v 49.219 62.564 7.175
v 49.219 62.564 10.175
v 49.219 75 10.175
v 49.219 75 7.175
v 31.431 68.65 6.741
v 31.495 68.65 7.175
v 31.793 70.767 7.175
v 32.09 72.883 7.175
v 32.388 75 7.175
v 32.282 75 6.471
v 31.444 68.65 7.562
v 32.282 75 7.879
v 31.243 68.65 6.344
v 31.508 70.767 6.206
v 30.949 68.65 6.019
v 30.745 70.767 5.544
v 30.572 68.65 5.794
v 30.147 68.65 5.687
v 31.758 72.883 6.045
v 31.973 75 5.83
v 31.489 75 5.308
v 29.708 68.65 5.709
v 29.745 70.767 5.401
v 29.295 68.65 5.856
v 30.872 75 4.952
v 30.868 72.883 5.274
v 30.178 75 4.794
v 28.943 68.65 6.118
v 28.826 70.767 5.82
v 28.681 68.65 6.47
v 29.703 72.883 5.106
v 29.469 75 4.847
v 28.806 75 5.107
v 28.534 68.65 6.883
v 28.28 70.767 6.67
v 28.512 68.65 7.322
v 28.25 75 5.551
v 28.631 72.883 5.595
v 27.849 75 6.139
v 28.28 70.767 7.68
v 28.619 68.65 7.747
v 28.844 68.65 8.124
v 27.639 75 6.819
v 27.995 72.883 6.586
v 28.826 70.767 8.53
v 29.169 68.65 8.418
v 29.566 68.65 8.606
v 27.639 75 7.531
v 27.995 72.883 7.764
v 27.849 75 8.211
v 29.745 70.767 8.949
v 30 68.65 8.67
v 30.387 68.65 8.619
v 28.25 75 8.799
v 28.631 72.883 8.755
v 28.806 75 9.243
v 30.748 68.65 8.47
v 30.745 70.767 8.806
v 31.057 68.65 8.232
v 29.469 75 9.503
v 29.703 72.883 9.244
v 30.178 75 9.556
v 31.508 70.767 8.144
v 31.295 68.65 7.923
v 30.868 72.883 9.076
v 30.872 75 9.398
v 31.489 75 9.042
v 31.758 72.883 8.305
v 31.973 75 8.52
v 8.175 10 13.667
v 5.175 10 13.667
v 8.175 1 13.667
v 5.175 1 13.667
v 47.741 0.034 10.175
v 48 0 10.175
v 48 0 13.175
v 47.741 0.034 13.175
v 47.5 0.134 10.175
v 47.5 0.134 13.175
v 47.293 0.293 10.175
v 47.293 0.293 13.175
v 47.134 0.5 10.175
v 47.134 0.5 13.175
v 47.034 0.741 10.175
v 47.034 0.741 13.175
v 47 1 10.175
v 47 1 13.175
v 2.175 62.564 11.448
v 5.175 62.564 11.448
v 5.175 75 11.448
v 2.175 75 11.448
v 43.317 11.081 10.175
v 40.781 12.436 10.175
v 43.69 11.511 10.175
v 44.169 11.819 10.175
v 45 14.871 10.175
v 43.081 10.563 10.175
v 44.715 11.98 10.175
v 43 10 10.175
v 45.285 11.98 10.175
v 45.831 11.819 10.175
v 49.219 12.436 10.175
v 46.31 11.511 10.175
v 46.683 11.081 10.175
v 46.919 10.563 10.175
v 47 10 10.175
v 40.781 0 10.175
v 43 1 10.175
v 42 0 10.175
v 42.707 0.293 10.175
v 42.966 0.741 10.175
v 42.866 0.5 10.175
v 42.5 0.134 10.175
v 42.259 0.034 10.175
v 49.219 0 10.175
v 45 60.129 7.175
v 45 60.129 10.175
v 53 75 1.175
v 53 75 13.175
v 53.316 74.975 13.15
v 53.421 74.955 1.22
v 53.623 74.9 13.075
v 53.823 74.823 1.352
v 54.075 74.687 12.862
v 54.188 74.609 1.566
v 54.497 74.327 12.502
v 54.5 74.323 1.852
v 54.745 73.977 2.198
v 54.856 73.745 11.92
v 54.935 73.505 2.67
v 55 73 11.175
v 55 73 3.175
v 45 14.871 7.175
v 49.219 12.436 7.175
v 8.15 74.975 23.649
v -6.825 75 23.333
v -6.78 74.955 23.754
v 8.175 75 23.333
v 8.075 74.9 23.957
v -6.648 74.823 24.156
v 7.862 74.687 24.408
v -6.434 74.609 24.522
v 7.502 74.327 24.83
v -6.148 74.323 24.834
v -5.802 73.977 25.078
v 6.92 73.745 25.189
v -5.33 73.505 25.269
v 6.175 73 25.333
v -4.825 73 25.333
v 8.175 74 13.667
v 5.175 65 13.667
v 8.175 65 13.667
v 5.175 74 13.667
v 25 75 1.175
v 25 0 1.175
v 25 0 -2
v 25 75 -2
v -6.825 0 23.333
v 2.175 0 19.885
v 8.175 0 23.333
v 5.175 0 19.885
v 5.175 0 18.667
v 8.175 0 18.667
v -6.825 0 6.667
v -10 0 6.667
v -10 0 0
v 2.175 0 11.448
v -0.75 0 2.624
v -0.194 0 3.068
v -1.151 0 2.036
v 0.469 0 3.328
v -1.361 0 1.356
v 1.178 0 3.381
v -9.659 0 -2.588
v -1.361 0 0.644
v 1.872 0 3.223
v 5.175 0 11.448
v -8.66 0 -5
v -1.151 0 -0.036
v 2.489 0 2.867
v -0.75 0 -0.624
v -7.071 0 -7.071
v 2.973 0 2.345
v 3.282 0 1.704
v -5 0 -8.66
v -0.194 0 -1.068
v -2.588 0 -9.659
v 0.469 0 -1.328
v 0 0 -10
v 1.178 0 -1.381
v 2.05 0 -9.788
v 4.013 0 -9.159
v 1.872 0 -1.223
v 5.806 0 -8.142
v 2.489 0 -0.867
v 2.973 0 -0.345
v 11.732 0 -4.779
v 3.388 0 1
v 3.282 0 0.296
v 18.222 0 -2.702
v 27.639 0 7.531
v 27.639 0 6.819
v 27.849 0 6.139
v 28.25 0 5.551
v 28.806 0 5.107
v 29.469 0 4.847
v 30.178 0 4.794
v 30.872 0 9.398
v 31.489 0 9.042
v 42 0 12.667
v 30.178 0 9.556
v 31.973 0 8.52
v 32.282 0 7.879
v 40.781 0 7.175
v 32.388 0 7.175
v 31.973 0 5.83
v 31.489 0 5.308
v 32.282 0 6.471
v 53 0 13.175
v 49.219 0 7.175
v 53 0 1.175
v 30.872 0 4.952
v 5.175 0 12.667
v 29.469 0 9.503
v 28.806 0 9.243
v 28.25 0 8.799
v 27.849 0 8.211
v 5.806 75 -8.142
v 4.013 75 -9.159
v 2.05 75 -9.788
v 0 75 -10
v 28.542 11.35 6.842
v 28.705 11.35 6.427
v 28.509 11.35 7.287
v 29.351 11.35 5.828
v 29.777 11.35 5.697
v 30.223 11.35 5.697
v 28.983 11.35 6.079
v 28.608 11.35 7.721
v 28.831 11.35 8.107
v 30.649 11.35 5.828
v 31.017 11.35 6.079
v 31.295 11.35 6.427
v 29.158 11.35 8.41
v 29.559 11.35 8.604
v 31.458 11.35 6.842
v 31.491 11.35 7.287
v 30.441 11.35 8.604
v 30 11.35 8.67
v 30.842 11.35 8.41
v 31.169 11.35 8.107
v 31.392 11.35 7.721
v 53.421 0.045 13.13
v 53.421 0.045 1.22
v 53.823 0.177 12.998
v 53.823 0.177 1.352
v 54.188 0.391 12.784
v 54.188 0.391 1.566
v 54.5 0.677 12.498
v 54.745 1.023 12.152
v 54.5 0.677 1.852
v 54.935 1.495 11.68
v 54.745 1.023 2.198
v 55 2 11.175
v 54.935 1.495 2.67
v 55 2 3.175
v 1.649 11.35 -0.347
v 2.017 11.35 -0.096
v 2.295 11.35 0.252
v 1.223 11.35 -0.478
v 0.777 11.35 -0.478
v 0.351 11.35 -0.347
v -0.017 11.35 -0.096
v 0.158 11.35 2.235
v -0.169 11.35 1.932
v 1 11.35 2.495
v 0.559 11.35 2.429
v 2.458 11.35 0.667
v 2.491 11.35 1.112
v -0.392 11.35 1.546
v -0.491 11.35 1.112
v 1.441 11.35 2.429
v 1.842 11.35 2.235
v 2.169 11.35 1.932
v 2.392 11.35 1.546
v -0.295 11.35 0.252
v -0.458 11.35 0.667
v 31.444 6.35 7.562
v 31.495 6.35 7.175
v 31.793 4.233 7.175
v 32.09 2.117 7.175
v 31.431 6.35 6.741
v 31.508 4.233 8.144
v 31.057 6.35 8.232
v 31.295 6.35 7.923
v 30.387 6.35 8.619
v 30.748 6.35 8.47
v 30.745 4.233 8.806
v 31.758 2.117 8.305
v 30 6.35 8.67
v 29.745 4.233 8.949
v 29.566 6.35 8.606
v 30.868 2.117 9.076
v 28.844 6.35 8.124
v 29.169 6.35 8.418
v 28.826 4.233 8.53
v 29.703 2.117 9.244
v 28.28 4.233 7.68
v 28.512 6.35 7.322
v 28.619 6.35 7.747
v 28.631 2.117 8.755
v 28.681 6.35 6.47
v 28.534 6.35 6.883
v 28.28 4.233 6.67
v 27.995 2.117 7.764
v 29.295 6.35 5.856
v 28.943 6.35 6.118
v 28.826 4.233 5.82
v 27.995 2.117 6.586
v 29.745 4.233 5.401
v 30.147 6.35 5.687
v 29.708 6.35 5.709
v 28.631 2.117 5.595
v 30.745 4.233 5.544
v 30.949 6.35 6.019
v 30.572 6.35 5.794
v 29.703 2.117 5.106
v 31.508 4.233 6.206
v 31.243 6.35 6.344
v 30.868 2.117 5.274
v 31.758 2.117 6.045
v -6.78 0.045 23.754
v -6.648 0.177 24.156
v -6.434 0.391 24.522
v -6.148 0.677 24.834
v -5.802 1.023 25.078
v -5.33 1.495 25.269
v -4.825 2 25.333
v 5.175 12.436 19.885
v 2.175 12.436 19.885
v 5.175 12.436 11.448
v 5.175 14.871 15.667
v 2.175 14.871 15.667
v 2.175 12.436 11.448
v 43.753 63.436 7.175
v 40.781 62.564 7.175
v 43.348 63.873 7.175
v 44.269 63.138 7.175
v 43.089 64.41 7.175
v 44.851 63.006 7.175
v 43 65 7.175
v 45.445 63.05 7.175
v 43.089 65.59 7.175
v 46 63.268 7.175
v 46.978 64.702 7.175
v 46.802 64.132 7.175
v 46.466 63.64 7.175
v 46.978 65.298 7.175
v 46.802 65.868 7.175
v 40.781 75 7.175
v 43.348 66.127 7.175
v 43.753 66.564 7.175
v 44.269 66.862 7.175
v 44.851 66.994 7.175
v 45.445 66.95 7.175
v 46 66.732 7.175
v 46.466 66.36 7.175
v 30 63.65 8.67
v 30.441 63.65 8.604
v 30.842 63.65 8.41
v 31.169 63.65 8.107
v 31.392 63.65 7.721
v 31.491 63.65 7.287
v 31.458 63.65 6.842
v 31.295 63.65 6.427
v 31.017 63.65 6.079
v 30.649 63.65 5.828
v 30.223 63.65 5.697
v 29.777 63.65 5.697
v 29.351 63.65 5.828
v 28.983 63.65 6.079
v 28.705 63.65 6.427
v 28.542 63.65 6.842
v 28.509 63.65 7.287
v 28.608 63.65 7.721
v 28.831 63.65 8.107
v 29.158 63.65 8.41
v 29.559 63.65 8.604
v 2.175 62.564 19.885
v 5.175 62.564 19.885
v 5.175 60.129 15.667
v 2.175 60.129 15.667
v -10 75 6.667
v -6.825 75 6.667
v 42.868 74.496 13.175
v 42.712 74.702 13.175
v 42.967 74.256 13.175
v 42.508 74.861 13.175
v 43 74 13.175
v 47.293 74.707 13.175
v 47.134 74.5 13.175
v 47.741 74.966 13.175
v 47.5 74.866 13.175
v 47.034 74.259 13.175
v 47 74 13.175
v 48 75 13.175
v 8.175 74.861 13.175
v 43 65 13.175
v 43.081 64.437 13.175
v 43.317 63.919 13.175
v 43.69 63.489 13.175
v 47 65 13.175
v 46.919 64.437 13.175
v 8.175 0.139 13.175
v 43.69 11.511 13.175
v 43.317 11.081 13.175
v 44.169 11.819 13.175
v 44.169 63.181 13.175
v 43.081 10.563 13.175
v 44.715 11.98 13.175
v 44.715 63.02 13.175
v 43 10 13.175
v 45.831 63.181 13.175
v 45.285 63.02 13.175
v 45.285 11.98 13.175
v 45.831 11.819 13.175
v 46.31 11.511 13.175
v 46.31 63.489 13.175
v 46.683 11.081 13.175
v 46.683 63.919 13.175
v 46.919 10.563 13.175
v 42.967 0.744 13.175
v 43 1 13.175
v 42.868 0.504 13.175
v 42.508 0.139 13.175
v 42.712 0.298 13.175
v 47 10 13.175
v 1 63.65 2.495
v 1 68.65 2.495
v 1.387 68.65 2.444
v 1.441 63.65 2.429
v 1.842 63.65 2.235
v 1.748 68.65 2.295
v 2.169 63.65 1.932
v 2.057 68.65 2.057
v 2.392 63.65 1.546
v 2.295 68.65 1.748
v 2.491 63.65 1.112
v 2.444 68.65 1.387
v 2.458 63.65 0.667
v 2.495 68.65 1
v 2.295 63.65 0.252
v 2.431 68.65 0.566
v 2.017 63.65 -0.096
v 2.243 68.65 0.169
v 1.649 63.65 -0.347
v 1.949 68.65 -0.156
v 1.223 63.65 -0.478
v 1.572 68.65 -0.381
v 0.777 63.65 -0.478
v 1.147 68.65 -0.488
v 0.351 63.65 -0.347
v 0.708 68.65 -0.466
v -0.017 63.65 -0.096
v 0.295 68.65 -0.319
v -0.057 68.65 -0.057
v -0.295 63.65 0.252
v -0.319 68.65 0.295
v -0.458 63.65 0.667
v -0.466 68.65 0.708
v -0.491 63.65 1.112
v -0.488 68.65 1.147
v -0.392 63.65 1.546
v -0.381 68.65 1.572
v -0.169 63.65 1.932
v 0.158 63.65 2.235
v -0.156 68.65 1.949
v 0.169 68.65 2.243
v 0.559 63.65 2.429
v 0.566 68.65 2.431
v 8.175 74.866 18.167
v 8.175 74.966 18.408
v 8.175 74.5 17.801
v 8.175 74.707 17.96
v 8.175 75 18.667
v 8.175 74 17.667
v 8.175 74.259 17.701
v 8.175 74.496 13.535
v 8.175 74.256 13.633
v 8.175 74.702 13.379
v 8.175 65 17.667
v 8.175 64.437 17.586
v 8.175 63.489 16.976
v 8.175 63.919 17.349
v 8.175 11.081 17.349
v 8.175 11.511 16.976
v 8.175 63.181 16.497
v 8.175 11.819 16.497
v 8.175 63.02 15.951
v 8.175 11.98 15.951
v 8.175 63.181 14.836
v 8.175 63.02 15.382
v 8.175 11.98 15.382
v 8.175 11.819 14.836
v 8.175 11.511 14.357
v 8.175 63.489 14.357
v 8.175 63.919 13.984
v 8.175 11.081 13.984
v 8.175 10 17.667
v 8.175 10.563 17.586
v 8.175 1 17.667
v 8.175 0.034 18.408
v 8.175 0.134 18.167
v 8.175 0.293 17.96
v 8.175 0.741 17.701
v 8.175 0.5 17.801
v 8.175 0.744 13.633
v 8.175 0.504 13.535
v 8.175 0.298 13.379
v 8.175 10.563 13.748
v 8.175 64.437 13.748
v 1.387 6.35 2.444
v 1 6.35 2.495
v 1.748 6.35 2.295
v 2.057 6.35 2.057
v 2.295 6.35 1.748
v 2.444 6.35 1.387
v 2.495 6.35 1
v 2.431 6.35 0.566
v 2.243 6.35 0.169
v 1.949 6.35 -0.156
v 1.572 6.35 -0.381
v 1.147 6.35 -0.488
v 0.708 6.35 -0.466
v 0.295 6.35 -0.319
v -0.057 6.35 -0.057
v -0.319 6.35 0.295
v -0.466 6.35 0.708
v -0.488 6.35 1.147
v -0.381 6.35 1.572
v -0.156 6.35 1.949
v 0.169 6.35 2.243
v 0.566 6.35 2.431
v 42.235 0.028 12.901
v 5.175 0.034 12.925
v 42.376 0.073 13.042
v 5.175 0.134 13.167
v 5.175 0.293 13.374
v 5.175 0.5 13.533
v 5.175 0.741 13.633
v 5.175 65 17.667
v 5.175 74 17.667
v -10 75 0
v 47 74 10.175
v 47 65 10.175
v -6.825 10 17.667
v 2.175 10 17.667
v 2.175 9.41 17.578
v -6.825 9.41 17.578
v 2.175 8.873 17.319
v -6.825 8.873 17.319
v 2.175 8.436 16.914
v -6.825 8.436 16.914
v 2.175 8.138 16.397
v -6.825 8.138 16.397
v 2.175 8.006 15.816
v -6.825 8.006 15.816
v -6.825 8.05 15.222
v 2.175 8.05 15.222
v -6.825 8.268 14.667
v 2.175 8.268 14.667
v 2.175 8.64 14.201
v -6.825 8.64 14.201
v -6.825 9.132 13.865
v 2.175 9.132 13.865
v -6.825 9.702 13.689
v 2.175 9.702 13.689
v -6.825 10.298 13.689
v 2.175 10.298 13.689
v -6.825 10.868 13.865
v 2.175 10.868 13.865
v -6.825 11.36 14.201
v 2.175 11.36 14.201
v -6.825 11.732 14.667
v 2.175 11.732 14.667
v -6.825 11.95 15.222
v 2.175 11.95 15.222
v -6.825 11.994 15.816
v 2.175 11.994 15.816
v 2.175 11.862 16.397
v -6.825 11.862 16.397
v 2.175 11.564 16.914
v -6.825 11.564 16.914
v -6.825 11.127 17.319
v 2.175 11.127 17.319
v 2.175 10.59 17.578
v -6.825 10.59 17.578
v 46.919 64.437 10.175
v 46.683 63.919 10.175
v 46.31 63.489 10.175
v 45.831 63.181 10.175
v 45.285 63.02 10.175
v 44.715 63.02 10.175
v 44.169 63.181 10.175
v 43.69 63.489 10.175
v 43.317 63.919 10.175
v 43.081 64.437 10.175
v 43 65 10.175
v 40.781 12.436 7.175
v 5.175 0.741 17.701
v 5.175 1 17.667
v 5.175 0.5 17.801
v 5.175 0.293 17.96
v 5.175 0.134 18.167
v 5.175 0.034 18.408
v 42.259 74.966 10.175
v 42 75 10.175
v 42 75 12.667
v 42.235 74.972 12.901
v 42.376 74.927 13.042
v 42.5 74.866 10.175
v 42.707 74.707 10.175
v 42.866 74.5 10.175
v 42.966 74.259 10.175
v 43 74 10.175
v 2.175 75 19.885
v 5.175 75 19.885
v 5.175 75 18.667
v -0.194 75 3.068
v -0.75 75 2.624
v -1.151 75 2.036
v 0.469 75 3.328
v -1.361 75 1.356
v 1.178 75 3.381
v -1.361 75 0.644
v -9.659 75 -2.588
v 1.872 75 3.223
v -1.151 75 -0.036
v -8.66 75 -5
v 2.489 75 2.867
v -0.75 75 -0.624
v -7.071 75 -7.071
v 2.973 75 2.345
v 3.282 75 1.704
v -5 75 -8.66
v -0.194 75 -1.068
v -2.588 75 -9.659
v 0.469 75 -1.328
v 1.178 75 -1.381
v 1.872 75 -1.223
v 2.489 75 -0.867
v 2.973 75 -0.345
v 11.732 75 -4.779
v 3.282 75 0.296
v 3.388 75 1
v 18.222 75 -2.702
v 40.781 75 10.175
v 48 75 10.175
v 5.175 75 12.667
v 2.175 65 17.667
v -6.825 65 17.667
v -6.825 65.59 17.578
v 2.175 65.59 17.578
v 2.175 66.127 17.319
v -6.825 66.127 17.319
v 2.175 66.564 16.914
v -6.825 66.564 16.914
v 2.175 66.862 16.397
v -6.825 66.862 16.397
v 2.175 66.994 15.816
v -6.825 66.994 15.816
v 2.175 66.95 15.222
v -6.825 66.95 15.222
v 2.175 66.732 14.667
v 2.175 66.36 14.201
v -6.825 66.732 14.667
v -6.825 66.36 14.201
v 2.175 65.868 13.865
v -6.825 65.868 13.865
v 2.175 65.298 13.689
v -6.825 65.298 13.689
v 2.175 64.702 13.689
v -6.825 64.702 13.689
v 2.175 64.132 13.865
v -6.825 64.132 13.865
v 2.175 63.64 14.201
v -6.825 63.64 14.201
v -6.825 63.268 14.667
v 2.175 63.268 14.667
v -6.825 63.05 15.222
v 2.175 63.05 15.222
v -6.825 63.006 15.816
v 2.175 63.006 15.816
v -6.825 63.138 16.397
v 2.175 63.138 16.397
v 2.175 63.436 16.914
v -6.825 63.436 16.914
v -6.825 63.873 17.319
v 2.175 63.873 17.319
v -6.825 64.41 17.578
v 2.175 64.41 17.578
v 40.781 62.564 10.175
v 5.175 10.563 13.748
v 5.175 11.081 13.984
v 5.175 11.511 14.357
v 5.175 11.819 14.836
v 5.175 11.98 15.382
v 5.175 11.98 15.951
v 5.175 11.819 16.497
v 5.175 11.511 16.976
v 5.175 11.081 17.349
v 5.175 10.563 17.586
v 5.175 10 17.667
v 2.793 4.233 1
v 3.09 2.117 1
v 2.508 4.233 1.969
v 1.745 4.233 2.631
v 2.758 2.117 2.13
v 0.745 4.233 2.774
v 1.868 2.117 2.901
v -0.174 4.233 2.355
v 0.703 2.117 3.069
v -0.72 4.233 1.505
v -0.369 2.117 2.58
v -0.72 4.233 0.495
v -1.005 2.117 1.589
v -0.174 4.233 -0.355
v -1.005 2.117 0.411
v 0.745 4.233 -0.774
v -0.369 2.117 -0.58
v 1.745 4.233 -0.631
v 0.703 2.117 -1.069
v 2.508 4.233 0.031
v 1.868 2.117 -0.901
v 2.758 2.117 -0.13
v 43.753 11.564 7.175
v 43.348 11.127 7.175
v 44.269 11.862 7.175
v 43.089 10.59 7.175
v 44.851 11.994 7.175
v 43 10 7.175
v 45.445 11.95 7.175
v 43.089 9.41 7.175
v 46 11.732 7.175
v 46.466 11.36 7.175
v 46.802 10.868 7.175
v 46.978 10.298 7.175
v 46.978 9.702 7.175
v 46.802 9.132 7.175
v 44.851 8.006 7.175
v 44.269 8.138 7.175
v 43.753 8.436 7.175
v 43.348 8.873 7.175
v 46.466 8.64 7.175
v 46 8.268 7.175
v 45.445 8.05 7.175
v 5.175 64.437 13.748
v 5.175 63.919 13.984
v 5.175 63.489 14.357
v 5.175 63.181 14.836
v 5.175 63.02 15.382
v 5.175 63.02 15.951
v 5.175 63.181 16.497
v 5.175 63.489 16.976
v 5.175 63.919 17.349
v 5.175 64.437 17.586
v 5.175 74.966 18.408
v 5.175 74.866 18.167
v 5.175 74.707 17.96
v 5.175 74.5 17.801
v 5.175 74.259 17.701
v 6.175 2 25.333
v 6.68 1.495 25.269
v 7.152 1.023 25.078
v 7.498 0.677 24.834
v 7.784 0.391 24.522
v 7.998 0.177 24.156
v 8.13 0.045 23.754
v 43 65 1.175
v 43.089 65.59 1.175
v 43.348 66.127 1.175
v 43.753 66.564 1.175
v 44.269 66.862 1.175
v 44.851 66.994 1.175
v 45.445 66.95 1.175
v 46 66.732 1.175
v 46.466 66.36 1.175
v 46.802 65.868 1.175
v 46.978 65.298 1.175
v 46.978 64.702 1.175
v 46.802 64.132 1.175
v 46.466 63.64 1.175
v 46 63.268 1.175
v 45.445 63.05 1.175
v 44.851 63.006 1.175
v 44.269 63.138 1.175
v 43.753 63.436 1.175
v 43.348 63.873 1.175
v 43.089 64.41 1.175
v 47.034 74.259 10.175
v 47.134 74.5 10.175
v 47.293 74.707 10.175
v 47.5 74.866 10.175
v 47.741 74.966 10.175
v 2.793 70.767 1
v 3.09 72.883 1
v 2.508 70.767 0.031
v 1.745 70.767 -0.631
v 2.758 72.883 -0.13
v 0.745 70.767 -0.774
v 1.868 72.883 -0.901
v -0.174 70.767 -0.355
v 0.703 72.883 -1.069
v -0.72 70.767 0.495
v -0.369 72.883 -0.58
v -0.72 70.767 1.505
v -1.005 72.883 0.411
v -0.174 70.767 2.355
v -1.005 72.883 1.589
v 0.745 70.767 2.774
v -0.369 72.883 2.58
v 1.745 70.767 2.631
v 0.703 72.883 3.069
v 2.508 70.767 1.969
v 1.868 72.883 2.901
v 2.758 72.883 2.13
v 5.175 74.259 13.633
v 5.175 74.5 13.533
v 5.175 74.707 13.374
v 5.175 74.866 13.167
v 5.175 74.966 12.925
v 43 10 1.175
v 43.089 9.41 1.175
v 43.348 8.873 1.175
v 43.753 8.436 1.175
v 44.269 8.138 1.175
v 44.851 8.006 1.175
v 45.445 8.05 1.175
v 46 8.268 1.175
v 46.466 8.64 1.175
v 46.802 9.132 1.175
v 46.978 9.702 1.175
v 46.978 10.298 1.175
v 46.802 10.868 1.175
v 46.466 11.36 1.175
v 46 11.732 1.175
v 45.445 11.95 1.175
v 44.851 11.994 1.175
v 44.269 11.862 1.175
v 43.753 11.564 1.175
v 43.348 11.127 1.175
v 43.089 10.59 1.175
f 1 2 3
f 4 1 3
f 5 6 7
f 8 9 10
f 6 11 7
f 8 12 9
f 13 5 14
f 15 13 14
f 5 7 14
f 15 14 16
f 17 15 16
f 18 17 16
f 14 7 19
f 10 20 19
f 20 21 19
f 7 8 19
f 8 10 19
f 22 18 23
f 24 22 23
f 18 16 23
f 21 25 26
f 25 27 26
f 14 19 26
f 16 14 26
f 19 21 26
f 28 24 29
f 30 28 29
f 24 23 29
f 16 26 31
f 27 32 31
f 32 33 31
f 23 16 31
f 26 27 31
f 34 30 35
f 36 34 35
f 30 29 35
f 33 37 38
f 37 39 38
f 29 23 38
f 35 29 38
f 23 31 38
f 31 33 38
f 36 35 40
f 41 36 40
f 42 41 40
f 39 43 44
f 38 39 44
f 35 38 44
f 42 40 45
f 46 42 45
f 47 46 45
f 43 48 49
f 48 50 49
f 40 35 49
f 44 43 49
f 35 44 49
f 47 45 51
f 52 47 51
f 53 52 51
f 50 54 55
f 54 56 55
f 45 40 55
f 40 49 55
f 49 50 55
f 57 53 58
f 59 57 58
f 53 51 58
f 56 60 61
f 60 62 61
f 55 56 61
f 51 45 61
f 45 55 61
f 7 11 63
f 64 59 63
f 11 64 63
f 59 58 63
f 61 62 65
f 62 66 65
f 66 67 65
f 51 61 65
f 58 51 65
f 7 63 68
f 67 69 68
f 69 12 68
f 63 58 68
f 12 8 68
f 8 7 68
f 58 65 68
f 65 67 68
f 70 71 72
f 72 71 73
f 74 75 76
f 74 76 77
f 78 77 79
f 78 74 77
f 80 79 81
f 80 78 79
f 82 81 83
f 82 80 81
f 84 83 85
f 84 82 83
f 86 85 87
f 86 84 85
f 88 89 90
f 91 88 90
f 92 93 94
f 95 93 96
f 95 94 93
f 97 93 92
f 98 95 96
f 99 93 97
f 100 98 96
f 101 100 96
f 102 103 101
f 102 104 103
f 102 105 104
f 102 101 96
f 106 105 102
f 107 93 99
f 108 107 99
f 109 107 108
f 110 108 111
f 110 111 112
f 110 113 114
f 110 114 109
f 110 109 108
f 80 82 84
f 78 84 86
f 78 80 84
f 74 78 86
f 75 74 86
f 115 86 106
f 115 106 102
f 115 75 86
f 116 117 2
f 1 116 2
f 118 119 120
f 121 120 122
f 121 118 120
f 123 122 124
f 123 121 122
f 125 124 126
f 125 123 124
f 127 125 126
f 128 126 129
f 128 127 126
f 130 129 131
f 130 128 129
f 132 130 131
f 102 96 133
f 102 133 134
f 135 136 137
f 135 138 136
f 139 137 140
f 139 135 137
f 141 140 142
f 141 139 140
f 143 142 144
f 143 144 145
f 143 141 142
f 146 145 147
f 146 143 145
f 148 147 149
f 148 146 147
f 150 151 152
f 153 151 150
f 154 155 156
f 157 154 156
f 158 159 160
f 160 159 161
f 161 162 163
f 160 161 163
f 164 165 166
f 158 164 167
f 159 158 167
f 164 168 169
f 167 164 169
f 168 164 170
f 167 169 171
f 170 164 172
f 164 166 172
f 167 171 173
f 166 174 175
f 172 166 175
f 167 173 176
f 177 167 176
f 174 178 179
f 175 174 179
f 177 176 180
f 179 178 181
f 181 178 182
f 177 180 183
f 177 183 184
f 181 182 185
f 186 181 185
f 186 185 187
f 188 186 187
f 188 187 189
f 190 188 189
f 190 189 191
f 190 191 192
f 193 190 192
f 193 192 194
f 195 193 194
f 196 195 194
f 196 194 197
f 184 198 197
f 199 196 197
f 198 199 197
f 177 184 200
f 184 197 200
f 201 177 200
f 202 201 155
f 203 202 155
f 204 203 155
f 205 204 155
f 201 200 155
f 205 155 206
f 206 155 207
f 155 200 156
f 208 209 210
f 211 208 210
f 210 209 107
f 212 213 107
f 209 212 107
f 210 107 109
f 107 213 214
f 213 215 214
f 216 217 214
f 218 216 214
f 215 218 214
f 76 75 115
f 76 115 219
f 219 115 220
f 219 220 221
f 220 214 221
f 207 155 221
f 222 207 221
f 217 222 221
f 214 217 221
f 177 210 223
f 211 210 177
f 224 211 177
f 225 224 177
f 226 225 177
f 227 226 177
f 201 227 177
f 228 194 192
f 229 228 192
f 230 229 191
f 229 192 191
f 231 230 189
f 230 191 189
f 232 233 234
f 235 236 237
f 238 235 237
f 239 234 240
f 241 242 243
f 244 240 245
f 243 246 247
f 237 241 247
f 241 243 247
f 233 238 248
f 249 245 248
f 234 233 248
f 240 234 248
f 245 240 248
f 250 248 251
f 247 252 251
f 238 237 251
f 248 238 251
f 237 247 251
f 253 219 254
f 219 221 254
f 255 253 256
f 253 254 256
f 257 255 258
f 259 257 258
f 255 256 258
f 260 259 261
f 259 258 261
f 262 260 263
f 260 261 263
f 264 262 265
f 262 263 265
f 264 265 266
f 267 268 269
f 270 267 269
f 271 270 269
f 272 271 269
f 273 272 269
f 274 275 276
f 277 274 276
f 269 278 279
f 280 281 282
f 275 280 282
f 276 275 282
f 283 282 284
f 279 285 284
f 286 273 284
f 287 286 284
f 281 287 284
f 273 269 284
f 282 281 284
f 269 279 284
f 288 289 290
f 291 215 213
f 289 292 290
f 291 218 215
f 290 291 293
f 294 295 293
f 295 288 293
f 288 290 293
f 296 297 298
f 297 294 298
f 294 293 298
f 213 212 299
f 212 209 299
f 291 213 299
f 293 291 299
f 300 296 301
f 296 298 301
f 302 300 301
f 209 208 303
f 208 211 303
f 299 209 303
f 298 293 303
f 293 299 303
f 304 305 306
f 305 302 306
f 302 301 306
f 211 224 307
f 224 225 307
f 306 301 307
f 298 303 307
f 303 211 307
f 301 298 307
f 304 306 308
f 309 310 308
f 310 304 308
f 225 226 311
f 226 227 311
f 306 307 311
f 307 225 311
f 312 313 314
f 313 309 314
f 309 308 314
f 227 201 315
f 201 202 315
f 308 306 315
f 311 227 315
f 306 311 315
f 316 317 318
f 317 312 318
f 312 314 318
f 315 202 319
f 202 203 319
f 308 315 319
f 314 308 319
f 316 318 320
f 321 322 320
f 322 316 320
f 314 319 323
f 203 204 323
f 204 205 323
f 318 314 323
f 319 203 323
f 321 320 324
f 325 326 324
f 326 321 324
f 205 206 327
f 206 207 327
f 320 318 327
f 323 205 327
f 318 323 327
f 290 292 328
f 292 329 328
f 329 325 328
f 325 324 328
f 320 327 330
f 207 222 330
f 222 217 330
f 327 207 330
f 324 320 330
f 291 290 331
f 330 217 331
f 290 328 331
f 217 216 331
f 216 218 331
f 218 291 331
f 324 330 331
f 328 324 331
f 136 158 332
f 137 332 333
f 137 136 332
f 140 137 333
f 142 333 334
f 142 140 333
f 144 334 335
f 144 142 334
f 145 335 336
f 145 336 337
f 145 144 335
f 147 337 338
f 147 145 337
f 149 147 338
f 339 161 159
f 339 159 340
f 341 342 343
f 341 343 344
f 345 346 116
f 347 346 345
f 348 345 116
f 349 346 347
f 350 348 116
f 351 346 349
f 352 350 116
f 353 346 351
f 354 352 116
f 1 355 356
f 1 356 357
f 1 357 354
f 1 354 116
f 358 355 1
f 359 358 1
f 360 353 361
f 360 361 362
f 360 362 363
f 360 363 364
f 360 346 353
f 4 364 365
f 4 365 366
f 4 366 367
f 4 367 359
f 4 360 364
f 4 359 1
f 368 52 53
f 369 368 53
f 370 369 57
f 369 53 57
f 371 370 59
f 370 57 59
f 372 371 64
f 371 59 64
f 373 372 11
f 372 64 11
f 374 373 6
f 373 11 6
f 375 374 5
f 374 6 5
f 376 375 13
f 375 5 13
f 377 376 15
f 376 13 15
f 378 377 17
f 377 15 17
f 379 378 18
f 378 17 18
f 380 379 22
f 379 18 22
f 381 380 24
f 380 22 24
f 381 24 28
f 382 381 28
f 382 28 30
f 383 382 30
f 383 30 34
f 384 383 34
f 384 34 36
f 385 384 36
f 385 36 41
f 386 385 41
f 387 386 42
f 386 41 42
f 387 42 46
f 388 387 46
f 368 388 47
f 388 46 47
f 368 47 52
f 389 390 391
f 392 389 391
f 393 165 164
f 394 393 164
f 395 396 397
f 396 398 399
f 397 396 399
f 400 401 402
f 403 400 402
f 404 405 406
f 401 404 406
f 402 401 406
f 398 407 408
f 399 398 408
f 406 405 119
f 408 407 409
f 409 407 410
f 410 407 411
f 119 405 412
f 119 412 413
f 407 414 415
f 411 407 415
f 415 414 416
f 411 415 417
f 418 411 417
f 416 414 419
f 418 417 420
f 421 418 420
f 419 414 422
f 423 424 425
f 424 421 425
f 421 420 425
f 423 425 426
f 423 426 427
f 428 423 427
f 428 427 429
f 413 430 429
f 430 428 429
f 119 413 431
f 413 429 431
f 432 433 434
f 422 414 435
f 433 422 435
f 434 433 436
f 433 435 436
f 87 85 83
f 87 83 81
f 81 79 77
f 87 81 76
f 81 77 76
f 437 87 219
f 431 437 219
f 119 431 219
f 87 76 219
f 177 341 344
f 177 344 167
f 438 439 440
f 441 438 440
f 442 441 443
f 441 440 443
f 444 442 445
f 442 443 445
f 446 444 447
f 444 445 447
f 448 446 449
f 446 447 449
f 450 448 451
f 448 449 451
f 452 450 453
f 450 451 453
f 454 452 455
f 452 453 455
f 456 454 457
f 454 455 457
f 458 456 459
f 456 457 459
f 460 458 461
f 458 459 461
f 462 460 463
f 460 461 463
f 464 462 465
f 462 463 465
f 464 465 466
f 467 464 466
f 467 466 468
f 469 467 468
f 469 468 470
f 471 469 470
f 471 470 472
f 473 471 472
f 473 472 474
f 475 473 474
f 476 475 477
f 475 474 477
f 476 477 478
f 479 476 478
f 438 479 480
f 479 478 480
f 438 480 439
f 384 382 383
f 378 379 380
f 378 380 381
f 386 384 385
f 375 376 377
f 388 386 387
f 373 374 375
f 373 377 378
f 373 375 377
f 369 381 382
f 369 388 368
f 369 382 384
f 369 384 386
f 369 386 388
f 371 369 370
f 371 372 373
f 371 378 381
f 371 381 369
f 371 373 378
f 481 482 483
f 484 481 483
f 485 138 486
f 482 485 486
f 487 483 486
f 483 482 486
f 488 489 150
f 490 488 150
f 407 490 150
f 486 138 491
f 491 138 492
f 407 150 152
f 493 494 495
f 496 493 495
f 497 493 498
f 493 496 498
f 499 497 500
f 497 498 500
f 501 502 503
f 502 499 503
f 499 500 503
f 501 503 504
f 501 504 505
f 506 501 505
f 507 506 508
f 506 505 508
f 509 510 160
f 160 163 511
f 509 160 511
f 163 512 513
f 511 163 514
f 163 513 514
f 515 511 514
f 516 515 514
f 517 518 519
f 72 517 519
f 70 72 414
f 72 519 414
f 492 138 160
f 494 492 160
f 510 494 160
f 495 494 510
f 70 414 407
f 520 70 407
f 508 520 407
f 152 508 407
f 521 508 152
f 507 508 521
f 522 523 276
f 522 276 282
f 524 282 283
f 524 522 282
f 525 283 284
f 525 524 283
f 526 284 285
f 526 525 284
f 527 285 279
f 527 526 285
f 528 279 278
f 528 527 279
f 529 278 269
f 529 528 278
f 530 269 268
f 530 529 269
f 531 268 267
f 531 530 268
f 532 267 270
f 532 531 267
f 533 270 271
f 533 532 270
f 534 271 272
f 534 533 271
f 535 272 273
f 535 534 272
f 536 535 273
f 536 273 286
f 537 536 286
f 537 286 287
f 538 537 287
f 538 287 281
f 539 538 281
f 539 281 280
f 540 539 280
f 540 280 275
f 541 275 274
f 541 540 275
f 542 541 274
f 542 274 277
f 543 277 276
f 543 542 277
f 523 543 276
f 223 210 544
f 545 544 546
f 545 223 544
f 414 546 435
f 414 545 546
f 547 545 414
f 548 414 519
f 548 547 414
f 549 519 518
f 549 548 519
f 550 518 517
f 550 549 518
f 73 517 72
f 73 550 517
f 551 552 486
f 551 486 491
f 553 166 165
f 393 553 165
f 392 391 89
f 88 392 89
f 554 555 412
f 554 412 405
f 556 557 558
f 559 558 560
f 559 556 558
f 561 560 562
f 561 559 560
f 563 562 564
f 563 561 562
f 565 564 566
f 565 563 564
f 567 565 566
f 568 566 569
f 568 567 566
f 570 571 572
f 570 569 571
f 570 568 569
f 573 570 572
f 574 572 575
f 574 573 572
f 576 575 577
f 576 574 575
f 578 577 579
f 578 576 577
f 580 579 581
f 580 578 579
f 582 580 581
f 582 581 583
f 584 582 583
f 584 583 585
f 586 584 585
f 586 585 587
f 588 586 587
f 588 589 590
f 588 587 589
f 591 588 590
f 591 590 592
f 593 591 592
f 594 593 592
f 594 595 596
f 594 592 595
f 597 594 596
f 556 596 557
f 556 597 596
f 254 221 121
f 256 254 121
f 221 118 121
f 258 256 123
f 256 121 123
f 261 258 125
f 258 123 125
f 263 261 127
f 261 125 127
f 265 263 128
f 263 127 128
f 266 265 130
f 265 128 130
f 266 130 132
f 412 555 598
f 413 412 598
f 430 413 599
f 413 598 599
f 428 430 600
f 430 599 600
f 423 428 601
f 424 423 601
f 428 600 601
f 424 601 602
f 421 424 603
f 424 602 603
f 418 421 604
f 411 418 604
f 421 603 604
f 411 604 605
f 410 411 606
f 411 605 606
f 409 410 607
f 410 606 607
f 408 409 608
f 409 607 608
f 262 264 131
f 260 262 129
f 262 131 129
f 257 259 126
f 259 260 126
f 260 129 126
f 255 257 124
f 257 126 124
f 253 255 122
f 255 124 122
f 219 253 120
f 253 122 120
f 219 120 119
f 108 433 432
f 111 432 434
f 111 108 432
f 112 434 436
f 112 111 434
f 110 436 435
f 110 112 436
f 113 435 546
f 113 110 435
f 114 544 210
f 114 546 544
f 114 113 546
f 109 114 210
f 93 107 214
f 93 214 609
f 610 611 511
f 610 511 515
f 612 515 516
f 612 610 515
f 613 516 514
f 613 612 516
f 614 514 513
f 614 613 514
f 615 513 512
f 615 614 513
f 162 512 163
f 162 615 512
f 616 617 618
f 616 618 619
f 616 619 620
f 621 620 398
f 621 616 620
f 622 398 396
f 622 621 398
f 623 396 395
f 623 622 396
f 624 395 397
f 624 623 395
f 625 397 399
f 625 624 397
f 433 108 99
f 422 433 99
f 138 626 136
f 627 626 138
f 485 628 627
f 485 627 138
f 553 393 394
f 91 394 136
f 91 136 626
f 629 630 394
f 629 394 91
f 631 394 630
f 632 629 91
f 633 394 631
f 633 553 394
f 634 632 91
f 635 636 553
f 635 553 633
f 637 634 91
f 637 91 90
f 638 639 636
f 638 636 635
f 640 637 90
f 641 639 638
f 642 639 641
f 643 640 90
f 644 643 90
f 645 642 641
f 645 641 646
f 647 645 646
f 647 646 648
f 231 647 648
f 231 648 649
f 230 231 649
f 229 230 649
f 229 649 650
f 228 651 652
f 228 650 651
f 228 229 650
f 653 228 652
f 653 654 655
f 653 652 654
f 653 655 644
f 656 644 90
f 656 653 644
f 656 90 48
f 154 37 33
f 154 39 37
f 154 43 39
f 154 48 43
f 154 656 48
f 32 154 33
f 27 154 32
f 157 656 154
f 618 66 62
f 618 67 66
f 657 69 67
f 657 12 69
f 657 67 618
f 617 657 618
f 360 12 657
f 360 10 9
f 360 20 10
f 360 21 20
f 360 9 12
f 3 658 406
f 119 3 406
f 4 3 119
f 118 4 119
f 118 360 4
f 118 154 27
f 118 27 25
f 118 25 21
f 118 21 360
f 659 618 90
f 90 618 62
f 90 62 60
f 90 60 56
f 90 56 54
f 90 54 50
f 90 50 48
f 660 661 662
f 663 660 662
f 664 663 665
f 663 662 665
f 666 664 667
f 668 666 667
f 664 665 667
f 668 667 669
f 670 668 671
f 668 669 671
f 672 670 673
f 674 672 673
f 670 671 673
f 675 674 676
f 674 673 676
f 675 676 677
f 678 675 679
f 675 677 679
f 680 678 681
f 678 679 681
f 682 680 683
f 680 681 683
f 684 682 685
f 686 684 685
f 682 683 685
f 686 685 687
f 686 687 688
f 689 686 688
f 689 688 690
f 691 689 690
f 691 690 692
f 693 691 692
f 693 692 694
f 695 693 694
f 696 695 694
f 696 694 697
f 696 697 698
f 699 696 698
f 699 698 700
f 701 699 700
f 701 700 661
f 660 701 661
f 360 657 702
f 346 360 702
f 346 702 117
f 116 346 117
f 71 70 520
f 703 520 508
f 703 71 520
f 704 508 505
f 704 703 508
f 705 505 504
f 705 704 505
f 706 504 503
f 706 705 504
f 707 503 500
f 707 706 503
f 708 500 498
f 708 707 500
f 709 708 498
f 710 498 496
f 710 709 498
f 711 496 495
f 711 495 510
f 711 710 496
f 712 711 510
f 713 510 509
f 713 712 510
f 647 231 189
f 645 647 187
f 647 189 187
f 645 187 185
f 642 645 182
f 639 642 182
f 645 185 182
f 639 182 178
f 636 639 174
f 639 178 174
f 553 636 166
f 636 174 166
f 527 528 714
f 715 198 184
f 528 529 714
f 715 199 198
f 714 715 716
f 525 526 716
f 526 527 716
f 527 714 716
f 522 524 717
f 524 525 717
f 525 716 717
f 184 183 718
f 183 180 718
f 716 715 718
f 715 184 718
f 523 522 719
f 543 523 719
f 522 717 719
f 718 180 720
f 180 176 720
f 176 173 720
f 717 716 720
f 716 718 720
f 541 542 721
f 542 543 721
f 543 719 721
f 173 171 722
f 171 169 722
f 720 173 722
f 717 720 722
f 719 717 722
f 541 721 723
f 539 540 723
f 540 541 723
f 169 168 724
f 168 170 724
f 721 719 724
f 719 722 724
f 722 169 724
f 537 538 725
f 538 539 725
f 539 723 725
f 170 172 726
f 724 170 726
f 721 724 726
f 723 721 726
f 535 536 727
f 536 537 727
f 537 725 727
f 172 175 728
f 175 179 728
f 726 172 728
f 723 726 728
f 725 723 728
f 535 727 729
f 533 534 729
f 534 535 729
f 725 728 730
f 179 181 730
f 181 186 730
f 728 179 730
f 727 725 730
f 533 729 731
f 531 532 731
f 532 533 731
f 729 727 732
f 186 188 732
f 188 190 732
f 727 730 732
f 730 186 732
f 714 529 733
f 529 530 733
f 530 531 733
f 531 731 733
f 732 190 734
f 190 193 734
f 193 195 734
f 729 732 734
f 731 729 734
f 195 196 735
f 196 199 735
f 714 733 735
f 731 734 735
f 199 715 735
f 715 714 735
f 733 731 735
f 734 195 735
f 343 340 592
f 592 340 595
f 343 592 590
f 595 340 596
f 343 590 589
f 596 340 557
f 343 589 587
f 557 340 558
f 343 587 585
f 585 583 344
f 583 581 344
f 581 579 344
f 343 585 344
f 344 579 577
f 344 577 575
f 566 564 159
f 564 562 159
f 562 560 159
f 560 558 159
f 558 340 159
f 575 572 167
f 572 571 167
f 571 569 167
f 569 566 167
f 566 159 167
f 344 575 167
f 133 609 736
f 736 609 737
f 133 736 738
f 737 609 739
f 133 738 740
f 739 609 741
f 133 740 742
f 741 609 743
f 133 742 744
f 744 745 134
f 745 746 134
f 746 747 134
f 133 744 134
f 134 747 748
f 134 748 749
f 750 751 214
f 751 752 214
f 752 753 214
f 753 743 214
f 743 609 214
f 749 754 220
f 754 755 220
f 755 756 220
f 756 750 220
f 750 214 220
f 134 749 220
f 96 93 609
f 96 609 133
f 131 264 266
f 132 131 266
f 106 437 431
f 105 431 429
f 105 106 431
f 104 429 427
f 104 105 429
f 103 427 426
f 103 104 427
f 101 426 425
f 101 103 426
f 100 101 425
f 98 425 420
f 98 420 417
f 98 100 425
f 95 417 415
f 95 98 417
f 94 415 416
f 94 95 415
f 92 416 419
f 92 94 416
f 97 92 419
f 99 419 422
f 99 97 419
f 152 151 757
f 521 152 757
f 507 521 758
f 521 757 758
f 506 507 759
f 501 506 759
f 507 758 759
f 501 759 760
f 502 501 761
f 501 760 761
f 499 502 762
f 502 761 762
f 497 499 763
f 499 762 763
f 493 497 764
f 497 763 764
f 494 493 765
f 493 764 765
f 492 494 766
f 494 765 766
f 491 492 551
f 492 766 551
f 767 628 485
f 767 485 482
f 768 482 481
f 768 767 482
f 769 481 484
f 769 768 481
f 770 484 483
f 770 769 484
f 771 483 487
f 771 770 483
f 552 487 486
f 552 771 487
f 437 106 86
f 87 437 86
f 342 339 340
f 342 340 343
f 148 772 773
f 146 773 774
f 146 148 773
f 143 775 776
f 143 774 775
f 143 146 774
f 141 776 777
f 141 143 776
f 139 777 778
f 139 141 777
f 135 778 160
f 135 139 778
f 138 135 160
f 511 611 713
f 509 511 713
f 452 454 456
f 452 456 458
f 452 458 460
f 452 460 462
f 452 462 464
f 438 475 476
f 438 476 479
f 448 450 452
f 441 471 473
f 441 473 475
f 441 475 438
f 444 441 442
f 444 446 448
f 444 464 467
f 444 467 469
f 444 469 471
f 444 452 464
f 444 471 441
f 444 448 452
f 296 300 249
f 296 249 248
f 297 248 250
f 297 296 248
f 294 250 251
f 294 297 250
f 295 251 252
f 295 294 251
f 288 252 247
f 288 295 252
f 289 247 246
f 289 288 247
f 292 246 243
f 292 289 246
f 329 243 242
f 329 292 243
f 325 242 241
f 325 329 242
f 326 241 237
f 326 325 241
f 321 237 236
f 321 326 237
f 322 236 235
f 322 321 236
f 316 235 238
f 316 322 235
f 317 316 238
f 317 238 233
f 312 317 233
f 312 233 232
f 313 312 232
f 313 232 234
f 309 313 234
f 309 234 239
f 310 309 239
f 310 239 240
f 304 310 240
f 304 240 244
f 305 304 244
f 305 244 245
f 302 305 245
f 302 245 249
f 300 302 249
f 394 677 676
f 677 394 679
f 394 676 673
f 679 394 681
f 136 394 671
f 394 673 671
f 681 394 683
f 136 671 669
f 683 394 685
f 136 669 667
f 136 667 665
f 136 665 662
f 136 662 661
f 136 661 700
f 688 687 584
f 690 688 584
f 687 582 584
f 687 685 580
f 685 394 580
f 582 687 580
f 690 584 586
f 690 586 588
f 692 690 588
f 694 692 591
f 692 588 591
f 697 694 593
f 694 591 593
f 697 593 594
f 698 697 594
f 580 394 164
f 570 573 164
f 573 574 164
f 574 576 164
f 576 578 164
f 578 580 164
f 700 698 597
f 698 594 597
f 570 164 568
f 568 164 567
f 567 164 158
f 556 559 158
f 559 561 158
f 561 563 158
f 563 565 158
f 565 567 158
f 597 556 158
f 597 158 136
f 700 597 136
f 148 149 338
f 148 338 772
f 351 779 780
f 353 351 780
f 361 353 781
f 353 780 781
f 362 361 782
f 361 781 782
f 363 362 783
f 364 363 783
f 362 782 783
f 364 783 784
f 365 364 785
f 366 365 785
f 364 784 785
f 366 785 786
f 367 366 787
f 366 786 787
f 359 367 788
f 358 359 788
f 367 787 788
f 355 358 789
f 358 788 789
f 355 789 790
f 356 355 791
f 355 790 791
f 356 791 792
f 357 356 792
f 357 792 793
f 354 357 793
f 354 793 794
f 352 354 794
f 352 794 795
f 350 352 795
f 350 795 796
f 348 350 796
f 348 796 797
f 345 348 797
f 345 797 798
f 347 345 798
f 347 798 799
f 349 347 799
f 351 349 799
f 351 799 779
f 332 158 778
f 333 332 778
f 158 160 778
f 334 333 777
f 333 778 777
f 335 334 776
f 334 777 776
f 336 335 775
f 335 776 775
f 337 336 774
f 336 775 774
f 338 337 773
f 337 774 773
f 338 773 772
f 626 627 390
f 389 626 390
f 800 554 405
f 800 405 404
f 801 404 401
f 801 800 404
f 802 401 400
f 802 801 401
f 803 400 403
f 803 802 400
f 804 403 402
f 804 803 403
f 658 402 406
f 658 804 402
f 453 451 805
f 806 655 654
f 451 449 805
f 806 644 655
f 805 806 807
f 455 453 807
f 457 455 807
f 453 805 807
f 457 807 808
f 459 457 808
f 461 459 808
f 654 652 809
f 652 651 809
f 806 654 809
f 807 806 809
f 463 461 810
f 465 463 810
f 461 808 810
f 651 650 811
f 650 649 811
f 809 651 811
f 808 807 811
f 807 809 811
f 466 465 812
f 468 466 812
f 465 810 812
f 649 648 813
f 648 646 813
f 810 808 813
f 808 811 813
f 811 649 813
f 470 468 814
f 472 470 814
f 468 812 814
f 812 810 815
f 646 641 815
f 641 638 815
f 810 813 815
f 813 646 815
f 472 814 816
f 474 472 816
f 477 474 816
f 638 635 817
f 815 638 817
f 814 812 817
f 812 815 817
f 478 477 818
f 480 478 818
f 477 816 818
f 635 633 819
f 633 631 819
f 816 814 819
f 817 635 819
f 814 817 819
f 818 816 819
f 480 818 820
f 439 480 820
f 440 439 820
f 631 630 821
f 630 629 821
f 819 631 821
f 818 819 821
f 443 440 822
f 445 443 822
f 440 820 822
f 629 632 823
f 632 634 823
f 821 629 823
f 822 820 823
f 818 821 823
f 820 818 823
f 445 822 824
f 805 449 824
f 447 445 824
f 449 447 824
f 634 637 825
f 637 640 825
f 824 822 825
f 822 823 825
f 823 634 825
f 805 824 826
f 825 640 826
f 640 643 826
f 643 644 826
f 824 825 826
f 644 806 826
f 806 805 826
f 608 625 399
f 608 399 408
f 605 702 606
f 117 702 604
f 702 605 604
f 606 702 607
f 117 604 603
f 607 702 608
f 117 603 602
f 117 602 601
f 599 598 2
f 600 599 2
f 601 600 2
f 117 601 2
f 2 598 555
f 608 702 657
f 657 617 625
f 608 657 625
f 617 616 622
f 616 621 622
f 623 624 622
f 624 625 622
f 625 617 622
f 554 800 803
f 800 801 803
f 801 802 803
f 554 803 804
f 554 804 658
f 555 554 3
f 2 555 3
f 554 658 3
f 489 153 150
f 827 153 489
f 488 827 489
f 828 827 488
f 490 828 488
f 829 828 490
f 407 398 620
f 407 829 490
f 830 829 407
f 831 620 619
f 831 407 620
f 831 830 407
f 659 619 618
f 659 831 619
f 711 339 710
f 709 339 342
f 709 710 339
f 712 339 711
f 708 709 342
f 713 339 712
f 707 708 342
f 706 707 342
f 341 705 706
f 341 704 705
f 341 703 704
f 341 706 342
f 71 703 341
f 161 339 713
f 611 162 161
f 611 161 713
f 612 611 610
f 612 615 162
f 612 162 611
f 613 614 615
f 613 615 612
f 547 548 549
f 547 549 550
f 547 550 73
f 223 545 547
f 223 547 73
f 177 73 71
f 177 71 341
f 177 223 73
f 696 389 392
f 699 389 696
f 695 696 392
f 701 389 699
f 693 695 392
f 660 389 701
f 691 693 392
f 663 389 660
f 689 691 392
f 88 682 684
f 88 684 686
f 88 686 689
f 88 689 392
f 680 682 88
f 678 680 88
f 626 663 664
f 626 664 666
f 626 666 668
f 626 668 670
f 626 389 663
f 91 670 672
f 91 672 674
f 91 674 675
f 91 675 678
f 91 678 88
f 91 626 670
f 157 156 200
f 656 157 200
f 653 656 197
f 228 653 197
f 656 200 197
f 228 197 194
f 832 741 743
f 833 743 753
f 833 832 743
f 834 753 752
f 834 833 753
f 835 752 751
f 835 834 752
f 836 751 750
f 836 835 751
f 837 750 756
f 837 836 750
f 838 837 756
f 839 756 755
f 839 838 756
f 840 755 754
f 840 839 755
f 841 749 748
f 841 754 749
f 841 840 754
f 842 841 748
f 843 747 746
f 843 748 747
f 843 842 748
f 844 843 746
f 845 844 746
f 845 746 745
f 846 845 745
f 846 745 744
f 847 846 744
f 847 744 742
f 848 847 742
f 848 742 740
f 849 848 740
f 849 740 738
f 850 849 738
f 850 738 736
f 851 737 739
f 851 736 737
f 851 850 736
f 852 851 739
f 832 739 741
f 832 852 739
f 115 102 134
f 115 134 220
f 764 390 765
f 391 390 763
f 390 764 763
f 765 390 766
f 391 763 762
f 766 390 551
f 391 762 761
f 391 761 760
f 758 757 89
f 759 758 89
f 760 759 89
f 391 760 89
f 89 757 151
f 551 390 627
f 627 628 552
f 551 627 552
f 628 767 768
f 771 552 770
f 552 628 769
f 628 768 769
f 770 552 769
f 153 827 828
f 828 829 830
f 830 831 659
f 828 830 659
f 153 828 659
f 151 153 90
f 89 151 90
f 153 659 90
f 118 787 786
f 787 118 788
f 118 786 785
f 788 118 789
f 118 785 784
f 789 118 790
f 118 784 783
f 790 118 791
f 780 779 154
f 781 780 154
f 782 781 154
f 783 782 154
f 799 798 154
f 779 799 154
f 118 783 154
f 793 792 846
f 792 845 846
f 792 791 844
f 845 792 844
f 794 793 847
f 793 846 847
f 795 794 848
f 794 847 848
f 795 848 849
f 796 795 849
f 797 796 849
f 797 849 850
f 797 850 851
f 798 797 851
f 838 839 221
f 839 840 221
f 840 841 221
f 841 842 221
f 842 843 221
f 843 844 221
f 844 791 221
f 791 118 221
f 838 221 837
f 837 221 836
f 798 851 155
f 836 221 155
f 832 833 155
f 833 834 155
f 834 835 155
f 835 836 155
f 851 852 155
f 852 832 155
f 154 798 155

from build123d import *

# Parameters (mm, degrees)
BOSS_EXTRUDE1_DEPTH          = 75
SKETCH2_R                    = 2
CUT_EXTRUDE1_DEPTH           = 15
SKETCH4_R                    = 2
CUT_EXTRUDE2_DEPTH           = 12
SKETCH3_R                    = 2.3876
CUT_EXTRUDE3_DEPTH           = 6.35
CUT_EXTRUDE3_DRAFT           = -8
CUT_EXTRUDE3_PROFILE_2_DEPTH = 6.35
CUT_EXTRUDE3_PROFILE_2_DRAFT = -8
CUT_EXTRUDE4_START           = -3
CUT_EXTRUDE4_DEPTH           = 3
CUT_EXTRUDE5_START           = -3
CUT_EXTRUDE5_DEPTH           = 3
CUT_EXTRUDE6_START           = -3
CUT_EXTRUDE6_DEPTH           = 3
CUT_EXTRUDE7_START           = -3
CUT_EXTRUDE7_DEPTH           = 3
SKETCH9_R                    = 1.4951657
CUT_EXTRUDE8_DEPTH           = 5
MIRROR2_COPY_1_SKETCH_R      = 2.3876
MIRROR2_COPY_1_DEPTH         = 6.35
MIRROR2_COPY_1_DRAFT         = -8
MIRROR2_COPY_2_SKETCH_R      = 2.3876
MIRROR2_COPY_2_DEPTH         = 6.35
MIRROR2_COPY_2_DRAFT         = -8
MIRROR2_COPY_3_SKETCH_R      = 2.3876
MIRROR2_COPY_3_DEPTH         = 6.35
MIRROR2_COPY_3_DRAFT         = -8
FILLET2_START                = 5.175
FILLET2_DEPTH                = 42.1845
FILLET2_START_2              = 10.175
FILLET2_2_DEPTH              = 3.491666667
FILLET2_3_DEPTH              = 37.825
FILLET3_R                    = 2


with BuildPart() as part:
    # Sketch1 → Boss-Extrude1 (new body)
    with BuildSketch(Plane(origin=(0, 0, 0), x_dir=(1, 0, 0), z_dir=(0, 1, 0))):
        with BuildLine():
            Line((-6.825, -6.666666667), (-6.825, -25.333333333))
            Line((-6.825, -25.333333333), (8.175, -25.333333333))
            Line((8.175, -25.333333333), (8.175, -13.175))
            Line((8.175, -13.175), (55, -13.175))
            Line((55, -13.175), (55, -1.175))
            Line((55, -1.175), (25, -1.175))
            Line((25, -1.175), (25, 2))
            ThreePointArc((25, 2), (14.923352523, 3.572976633), (5.805515239, 8.142235123))
            ThreePointArc((5.805515239, 8.142235123), (3.047757271, 9.524241472), (0, 10))
            ThreePointArc((0, 10), (-7.071067812, 7.071067812), (-10, 0))
            Line((-10, 0), (-10, -6.666666667))
            Line((-10, -6.666666667), (-6.825, -6.666666667))
        make_face()
    extrude(amount=BOSS_EXTRUDE1_DEPTH)

    # Sketch2 → Cut-Extrude1 (cut)
    with BuildSketch(Plane.ZY.offset(6.825)):
        with Locations((15.666666667, 65)):
            Circle(SKETCH2_R)
    cut_extrude1 = extrude(amount=-CUT_EXTRUDE1_DEPTH, mode=Mode.SUBTRACT)

    # Sketch4 → Cut-Extrude2 (cut)
    with BuildSketch(Plane(origin=(0, 0, 1.175), x_dir=(-1, 0, 0), z_dir=(0, 0, -1))):
        with Locations((-45, 65)):
            Circle(SKETCH4_R)
    cut_extrude2 = extrude(amount=-CUT_EXTRUDE2_DEPTH, mode=Mode.SUBTRACT)


with BuildPart() as cut_extrude3_tool:
    # Sketch3 → Cut-Extrude3 (with draft: the straight prism first)
    with BuildSketch(Plane(origin=(0, 75, 0), x_dir=(1, 0, 0), z_dir=(0, 1, 0))):
        with Locations((1, -1)):
            Circle(SKETCH3_R)
    extrude(amount=-CUT_EXTRUDE3_DEPTH)
    # Cut-Extrude3: the draft: its side faces are tilted about the plane it starts from
    cut_extrude3_sides = [cut_extrude3_tool.faces().sort_by_distance(p)[0] for p in [
        (-1.3876, 71.825, 1),
    ]]
    draft(cut_extrude3_sides, Plane(origin=(0, 75, 0), x_dir=(1, 0, 0), z_dir=(0, 1, 0)), CUT_EXTRUDE3_DRAFT)


with BuildPart() as part_1:
    add(part.part)

    # Cut-Extrude3: cut by cut_extrude3_tool
    add(cut_extrude3_tool.part, mode=Mode.SUBTRACT)


with BuildPart() as cut_extrude3_profile_2_tool:
    # Sketch3 → Cut-Extrude3 profile 2 (with draft: the straight prism first)
    with BuildSketch(Plane(origin=(0, 75, 0), x_dir=(1, 0, 0), z_dir=(0, 1, 0))):
        with Locations((30, -7.175)):
            Circle(SKETCH3_R)
    extrude(amount=-CUT_EXTRUDE3_PROFILE_2_DEPTH)
    # Cut-Extrude3 profile 2: the draft: its side faces are tilted about the plane it starts from
    cut_extrude3_profile_2_sides = [cut_extrude3_profile_2_tool.faces().sort_by_distance(p)[0] for p in [
        (27.6124, 71.825, 7.175),
    ]]
    draft(cut_extrude3_profile_2_sides, Plane(origin=(0, 75, 0), x_dir=(1, 0, 0), z_dir=(0, 1, 0)), CUT_EXTRUDE3_PROFILE_2_DRAFT)


with BuildPart() as part_2:
    add(part_1.part)

    # Cut-Extrude3 profile 2: cut by cut_extrude3_profile_2_tool
    add(cut_extrude3_profile_2_tool.part, mode=Mode.SUBTRACT)

    # Sketch5 → Cut-Extrude4 (cut)
    with BuildSketch(Plane(origin=(8.175, 0, 0), x_dir=(0, 0, -1), z_dir=(1, 0, 0)).offset(CUT_EXTRUDE4_START)):
        Polygon((-19.885416667, 62.564303552), (-15.666666667, 60.128607104), (-11.447916667, 62.564303552), (-11.447916667, 75), (-19.885416667, 75), align=None)
    cut_extrude4 = extrude(amount=-CUT_EXTRUDE4_DEPTH, mode=Mode.SUBTRACT)

    # Sketch6 → Cut-Extrude5 (cut)
    with BuildSketch(Plane(origin=(8.175, 0, 0), x_dir=(0, 0, -1), z_dir=(1, 0, 0)).offset(CUT_EXTRUDE5_START)):
        with BuildLine():
            Line((-13.666666667, 65), (-13.666666667, 75))
            Line((-13.666666667, 75), (-17.666666667, 75))
            Line((-17.666666667, 75), (-17.666666667, 65))
            ThreePointArc((-17.666666667, 65), (-15.666666667, 67), (-13.666666667, 65))
        make_face()
    cut_extrude5 = extrude(amount=CUT_EXTRUDE5_DEPTH, mode=Mode.SUBTRACT)

    # Sketch7 → Cut-Extrude6 (cut)
    with BuildSketch(Plane.XY.offset(13.175).offset(CUT_EXTRUDE6_START)):
        Polygon((40.78125, 62.564303552), (45, 60.128607104), (49.21875, 62.564303552), (49.21875, 75), (40.78125, 75), align=None)
    cut_extrude6 = extrude(amount=-CUT_EXTRUDE6_DEPTH, mode=Mode.SUBTRACT)

    # Sketch8 → Cut-Extrude7 (cut)
    with BuildSketch(Plane.XY.offset(13.175).offset(CUT_EXTRUDE7_START)):
        with BuildLine():
            Line((47, 65), (47, 75))
            Line((47, 75), (43, 75))
            Line((43, 75), (43, 65))
            ThreePointArc((43, 65), (45, 67), (47, 65))
        make_face()
    cut_extrude7 = extrude(amount=CUT_EXTRUDE7_DEPTH, mode=Mode.SUBTRACT)

    # Sketch9 → Cut-Extrude8 (cut)
    with BuildSketch(Plane(origin=(0, 68.65, 0), x_dir=(1, 0, 0), z_dir=(0, 1, 0))):
        with Locations(Location((1, -1, 0), (0, 0, 270))):
            Circle(SKETCH9_R)
        with Locations(Location((30, -7.175, 0), (0, 0, 270))):
            Circle(SKETCH9_R)
    cut_extrude8 = extrude(amount=-CUT_EXTRUDE8_DEPTH, mode=Mode.SUBTRACT)

    # Mirror2: Cut-Extrude1, Cut-Extrude2, Cut-Extrude4, Cut-Extrude5, Cut-Extrude6, Cut-Extrude7, Cut-Extrude8 across plane
    add(cut_extrude1.mirror(Plane.ZX.offset(37.5)), mode=Mode.SUBTRACT)
    add(cut_extrude2.mirror(Plane.ZX.offset(37.5)), mode=Mode.SUBTRACT)
    add(cut_extrude4.mirror(Plane.ZX.offset(37.5)), mode=Mode.SUBTRACT)
    add(cut_extrude5.mirror(Plane.ZX.offset(37.5)), mode=Mode.SUBTRACT)
    add(cut_extrude6.mirror(Plane.ZX.offset(37.5)), mode=Mode.SUBTRACT)
    add(cut_extrude7.mirror(Plane.ZX.offset(37.5)), mode=Mode.SUBTRACT)
    add(cut_extrude8.mirror(Plane.ZX.offset(37.5)), mode=Mode.SUBTRACT)


with BuildPart() as mirror2_copy_1_tool:
    # Mirror2 copy 1 sketch → Mirror2 copy 1 (with draft: the straight prism first)
    with BuildSketch(Plane.XZ):
        with Locations((1, 1)):
            Circle(MIRROR2_COPY_1_SKETCH_R)
    extrude(amount=-MIRROR2_COPY_1_DEPTH)
    # Mirror2 copy 1: the draft: its side faces are tilted about the plane it starts from
    mirror2_copy_1_sides = [mirror2_copy_1_tool.faces().sort_by_distance(p)[0] for p in [
        (-1.3876, 3.175, 1),
    ]]
    draft(mirror2_copy_1_sides, Plane.XZ, MIRROR2_COPY_1_DRAFT)


with BuildPart() as part_3:
    add(part_2.part)

    # Mirror2 copy 1: cut by mirror2_copy_1_tool
    add(mirror2_copy_1_tool.part, mode=Mode.SUBTRACT)


with BuildPart() as mirror2_copy_2_tool:
    # Mirror2 copy 2 sketch → Mirror2 copy 2 (with draft: the straight prism first)
    with BuildSketch(Plane.XZ):
        with Locations((30, 7.175)):
            Circle(MIRROR2_COPY_2_SKETCH_R)
    extrude(amount=-MIRROR2_COPY_2_DEPTH)
    # Mirror2 copy 2: the draft: its side faces are tilted about the plane it starts from
    mirror2_copy_2_sides = [mirror2_copy_2_tool.faces().sort_by_distance(p)[0] for p in [
        (27.6124, 3.175, 7.175),
    ]]
    draft(mirror2_copy_2_sides, Plane.XZ, MIRROR2_COPY_2_DRAFT)


with BuildPart() as part_4:
    add(part_3.part)

    # Mirror2 copy 2: cut by mirror2_copy_2_tool
    add(mirror2_copy_2_tool.part, mode=Mode.SUBTRACT)


with BuildPart() as mirror2_copy_3_tool:
    # Mirror2 copy 3 sketch → Mirror2 copy 3 (with draft: the straight prism first)
    with BuildSketch(Plane.XZ):
        with Locations((30, 7.175)):
            Circle(MIRROR2_COPY_3_SKETCH_R)
    extrude(amount=-MIRROR2_COPY_3_DEPTH)
    # Mirror2 copy 3: the draft: its side faces are tilted about the plane it starts from
    mirror2_copy_3_sides = [mirror2_copy_3_tool.faces().sort_by_distance(p)[0] for p in [
        (27.6124, 3.175, 7.175),
    ]]
    draft(mirror2_copy_3_sides, Plane.XZ, MIRROR2_COPY_3_DRAFT)


with BuildPart() as part_5:
    add(part_4.part)

    # Mirror2 copy 3: cut by mirror2_copy_3_tool
    add(mirror2_copy_3_tool.part, mode=Mode.SUBTRACT)

    # Fillet2: read off the stored shape, not the designer's step
    # Fillet2 outline → Fillet2 (cut)
    with BuildSketch(Plane.YZ.offset(FILLET2_START)):
        with BuildLine():
            Line((1, 13.666666667), (0, 13.666666667))
            Line((0, 13.666666667), (0, 12.666666667))
            ThreePointArc((0, 12.666666667), (0.292893219, 13.373773448), (1, 13.666666667))
        make_face()
        with BuildLine():
            ThreePointArc((1, 17.666666667), (0.292893218, 17.959559886), (0, 18.666666667))
            Line((0, 18.666666667), (0, 17.666666667))
            Line((0, 17.666666667), (1, 17.666666667))
        make_face()
    extrude(amount=FILLET2_DEPTH, mode=Mode.SUBTRACT)

    # Fillet2 2 outline → Fillet2 2 (cut)
    with BuildSketch(Plane.XY.offset(FILLET2_START_2)):
        with BuildLine():
            Line((47, 1), (47, 0))
            Line((47, 0), (47.3595, 0))
            Line((47.3595, 0), (48, 0))
            ThreePointArc((48, 0), (47.292893219, 0.292893219), (47, 1))
        make_face()
        with BuildLine():
            Line((48, 75), (47, 75))
            Line((47, 75), (47, 74))
            ThreePointArc((47, 74), (47.292893219, 74.707106781), (48, 75))
        make_face()
        with BuildLine():
            Line((43, 75), (42, 75))
            ThreePointArc((42, 75), (42.707106781, 74.707106781), (43, 74))
            Line((43, 74), (43, 75))
        make_face()
        with BuildLine():
            ThreePointArc((43, 1), (42.707106781, 0.292893219), (42, 0))
            Line((42, 0), (43, 0))
            Line((43, 0), (43, 1))
        make_face()
    extrude(amount=FILLET2_2_DEPTH, mode=Mode.SUBTRACT)

    # Fillet2 3 outline → Fillet2 3 (cut)
    with BuildSketch(Plane.YZ.offset(FILLET2_START)):
        with BuildLine():
            Line((74, 17.666666667), (75, 17.666666667))
            Line((75, 17.666666667), (75, 18.666666667))
            ThreePointArc((75, 18.666666667), (74.707106782, 17.959559886), (74, 17.666666667))
        make_face()
        with BuildLine():
            Line((75, 12.666666667), (75, 13.666666667))
            Line((75, 13.666666667), (74, 13.666666667))
            ThreePointArc((74, 13.666666667), (74.707106781, 13.373773448), (75, 12.666666667))
        make_face()
    extrude(amount=FILLET2_3_DEPTH, mode=Mode.SUBTRACT)

    # Fillet3
    fillet3_edges = [part_5.edges().sort_by_distance(p)[0] for p in [
        (55, 0, 7.175),
        (0.675, 0, 25.333333333),
        (55, 37.5, 1.175),
        (55, 37.5, 13.175),
        (8.175, 37.5, 25.333333333),
        (-6.825, 37.5, 25.333333333),
        (0.675, 75, 25.333333333),
        (55, 75, 7.175),
    ]]
    fillet(fillet3_edges, radius=FILLET3_R)


solid = part_5.part
